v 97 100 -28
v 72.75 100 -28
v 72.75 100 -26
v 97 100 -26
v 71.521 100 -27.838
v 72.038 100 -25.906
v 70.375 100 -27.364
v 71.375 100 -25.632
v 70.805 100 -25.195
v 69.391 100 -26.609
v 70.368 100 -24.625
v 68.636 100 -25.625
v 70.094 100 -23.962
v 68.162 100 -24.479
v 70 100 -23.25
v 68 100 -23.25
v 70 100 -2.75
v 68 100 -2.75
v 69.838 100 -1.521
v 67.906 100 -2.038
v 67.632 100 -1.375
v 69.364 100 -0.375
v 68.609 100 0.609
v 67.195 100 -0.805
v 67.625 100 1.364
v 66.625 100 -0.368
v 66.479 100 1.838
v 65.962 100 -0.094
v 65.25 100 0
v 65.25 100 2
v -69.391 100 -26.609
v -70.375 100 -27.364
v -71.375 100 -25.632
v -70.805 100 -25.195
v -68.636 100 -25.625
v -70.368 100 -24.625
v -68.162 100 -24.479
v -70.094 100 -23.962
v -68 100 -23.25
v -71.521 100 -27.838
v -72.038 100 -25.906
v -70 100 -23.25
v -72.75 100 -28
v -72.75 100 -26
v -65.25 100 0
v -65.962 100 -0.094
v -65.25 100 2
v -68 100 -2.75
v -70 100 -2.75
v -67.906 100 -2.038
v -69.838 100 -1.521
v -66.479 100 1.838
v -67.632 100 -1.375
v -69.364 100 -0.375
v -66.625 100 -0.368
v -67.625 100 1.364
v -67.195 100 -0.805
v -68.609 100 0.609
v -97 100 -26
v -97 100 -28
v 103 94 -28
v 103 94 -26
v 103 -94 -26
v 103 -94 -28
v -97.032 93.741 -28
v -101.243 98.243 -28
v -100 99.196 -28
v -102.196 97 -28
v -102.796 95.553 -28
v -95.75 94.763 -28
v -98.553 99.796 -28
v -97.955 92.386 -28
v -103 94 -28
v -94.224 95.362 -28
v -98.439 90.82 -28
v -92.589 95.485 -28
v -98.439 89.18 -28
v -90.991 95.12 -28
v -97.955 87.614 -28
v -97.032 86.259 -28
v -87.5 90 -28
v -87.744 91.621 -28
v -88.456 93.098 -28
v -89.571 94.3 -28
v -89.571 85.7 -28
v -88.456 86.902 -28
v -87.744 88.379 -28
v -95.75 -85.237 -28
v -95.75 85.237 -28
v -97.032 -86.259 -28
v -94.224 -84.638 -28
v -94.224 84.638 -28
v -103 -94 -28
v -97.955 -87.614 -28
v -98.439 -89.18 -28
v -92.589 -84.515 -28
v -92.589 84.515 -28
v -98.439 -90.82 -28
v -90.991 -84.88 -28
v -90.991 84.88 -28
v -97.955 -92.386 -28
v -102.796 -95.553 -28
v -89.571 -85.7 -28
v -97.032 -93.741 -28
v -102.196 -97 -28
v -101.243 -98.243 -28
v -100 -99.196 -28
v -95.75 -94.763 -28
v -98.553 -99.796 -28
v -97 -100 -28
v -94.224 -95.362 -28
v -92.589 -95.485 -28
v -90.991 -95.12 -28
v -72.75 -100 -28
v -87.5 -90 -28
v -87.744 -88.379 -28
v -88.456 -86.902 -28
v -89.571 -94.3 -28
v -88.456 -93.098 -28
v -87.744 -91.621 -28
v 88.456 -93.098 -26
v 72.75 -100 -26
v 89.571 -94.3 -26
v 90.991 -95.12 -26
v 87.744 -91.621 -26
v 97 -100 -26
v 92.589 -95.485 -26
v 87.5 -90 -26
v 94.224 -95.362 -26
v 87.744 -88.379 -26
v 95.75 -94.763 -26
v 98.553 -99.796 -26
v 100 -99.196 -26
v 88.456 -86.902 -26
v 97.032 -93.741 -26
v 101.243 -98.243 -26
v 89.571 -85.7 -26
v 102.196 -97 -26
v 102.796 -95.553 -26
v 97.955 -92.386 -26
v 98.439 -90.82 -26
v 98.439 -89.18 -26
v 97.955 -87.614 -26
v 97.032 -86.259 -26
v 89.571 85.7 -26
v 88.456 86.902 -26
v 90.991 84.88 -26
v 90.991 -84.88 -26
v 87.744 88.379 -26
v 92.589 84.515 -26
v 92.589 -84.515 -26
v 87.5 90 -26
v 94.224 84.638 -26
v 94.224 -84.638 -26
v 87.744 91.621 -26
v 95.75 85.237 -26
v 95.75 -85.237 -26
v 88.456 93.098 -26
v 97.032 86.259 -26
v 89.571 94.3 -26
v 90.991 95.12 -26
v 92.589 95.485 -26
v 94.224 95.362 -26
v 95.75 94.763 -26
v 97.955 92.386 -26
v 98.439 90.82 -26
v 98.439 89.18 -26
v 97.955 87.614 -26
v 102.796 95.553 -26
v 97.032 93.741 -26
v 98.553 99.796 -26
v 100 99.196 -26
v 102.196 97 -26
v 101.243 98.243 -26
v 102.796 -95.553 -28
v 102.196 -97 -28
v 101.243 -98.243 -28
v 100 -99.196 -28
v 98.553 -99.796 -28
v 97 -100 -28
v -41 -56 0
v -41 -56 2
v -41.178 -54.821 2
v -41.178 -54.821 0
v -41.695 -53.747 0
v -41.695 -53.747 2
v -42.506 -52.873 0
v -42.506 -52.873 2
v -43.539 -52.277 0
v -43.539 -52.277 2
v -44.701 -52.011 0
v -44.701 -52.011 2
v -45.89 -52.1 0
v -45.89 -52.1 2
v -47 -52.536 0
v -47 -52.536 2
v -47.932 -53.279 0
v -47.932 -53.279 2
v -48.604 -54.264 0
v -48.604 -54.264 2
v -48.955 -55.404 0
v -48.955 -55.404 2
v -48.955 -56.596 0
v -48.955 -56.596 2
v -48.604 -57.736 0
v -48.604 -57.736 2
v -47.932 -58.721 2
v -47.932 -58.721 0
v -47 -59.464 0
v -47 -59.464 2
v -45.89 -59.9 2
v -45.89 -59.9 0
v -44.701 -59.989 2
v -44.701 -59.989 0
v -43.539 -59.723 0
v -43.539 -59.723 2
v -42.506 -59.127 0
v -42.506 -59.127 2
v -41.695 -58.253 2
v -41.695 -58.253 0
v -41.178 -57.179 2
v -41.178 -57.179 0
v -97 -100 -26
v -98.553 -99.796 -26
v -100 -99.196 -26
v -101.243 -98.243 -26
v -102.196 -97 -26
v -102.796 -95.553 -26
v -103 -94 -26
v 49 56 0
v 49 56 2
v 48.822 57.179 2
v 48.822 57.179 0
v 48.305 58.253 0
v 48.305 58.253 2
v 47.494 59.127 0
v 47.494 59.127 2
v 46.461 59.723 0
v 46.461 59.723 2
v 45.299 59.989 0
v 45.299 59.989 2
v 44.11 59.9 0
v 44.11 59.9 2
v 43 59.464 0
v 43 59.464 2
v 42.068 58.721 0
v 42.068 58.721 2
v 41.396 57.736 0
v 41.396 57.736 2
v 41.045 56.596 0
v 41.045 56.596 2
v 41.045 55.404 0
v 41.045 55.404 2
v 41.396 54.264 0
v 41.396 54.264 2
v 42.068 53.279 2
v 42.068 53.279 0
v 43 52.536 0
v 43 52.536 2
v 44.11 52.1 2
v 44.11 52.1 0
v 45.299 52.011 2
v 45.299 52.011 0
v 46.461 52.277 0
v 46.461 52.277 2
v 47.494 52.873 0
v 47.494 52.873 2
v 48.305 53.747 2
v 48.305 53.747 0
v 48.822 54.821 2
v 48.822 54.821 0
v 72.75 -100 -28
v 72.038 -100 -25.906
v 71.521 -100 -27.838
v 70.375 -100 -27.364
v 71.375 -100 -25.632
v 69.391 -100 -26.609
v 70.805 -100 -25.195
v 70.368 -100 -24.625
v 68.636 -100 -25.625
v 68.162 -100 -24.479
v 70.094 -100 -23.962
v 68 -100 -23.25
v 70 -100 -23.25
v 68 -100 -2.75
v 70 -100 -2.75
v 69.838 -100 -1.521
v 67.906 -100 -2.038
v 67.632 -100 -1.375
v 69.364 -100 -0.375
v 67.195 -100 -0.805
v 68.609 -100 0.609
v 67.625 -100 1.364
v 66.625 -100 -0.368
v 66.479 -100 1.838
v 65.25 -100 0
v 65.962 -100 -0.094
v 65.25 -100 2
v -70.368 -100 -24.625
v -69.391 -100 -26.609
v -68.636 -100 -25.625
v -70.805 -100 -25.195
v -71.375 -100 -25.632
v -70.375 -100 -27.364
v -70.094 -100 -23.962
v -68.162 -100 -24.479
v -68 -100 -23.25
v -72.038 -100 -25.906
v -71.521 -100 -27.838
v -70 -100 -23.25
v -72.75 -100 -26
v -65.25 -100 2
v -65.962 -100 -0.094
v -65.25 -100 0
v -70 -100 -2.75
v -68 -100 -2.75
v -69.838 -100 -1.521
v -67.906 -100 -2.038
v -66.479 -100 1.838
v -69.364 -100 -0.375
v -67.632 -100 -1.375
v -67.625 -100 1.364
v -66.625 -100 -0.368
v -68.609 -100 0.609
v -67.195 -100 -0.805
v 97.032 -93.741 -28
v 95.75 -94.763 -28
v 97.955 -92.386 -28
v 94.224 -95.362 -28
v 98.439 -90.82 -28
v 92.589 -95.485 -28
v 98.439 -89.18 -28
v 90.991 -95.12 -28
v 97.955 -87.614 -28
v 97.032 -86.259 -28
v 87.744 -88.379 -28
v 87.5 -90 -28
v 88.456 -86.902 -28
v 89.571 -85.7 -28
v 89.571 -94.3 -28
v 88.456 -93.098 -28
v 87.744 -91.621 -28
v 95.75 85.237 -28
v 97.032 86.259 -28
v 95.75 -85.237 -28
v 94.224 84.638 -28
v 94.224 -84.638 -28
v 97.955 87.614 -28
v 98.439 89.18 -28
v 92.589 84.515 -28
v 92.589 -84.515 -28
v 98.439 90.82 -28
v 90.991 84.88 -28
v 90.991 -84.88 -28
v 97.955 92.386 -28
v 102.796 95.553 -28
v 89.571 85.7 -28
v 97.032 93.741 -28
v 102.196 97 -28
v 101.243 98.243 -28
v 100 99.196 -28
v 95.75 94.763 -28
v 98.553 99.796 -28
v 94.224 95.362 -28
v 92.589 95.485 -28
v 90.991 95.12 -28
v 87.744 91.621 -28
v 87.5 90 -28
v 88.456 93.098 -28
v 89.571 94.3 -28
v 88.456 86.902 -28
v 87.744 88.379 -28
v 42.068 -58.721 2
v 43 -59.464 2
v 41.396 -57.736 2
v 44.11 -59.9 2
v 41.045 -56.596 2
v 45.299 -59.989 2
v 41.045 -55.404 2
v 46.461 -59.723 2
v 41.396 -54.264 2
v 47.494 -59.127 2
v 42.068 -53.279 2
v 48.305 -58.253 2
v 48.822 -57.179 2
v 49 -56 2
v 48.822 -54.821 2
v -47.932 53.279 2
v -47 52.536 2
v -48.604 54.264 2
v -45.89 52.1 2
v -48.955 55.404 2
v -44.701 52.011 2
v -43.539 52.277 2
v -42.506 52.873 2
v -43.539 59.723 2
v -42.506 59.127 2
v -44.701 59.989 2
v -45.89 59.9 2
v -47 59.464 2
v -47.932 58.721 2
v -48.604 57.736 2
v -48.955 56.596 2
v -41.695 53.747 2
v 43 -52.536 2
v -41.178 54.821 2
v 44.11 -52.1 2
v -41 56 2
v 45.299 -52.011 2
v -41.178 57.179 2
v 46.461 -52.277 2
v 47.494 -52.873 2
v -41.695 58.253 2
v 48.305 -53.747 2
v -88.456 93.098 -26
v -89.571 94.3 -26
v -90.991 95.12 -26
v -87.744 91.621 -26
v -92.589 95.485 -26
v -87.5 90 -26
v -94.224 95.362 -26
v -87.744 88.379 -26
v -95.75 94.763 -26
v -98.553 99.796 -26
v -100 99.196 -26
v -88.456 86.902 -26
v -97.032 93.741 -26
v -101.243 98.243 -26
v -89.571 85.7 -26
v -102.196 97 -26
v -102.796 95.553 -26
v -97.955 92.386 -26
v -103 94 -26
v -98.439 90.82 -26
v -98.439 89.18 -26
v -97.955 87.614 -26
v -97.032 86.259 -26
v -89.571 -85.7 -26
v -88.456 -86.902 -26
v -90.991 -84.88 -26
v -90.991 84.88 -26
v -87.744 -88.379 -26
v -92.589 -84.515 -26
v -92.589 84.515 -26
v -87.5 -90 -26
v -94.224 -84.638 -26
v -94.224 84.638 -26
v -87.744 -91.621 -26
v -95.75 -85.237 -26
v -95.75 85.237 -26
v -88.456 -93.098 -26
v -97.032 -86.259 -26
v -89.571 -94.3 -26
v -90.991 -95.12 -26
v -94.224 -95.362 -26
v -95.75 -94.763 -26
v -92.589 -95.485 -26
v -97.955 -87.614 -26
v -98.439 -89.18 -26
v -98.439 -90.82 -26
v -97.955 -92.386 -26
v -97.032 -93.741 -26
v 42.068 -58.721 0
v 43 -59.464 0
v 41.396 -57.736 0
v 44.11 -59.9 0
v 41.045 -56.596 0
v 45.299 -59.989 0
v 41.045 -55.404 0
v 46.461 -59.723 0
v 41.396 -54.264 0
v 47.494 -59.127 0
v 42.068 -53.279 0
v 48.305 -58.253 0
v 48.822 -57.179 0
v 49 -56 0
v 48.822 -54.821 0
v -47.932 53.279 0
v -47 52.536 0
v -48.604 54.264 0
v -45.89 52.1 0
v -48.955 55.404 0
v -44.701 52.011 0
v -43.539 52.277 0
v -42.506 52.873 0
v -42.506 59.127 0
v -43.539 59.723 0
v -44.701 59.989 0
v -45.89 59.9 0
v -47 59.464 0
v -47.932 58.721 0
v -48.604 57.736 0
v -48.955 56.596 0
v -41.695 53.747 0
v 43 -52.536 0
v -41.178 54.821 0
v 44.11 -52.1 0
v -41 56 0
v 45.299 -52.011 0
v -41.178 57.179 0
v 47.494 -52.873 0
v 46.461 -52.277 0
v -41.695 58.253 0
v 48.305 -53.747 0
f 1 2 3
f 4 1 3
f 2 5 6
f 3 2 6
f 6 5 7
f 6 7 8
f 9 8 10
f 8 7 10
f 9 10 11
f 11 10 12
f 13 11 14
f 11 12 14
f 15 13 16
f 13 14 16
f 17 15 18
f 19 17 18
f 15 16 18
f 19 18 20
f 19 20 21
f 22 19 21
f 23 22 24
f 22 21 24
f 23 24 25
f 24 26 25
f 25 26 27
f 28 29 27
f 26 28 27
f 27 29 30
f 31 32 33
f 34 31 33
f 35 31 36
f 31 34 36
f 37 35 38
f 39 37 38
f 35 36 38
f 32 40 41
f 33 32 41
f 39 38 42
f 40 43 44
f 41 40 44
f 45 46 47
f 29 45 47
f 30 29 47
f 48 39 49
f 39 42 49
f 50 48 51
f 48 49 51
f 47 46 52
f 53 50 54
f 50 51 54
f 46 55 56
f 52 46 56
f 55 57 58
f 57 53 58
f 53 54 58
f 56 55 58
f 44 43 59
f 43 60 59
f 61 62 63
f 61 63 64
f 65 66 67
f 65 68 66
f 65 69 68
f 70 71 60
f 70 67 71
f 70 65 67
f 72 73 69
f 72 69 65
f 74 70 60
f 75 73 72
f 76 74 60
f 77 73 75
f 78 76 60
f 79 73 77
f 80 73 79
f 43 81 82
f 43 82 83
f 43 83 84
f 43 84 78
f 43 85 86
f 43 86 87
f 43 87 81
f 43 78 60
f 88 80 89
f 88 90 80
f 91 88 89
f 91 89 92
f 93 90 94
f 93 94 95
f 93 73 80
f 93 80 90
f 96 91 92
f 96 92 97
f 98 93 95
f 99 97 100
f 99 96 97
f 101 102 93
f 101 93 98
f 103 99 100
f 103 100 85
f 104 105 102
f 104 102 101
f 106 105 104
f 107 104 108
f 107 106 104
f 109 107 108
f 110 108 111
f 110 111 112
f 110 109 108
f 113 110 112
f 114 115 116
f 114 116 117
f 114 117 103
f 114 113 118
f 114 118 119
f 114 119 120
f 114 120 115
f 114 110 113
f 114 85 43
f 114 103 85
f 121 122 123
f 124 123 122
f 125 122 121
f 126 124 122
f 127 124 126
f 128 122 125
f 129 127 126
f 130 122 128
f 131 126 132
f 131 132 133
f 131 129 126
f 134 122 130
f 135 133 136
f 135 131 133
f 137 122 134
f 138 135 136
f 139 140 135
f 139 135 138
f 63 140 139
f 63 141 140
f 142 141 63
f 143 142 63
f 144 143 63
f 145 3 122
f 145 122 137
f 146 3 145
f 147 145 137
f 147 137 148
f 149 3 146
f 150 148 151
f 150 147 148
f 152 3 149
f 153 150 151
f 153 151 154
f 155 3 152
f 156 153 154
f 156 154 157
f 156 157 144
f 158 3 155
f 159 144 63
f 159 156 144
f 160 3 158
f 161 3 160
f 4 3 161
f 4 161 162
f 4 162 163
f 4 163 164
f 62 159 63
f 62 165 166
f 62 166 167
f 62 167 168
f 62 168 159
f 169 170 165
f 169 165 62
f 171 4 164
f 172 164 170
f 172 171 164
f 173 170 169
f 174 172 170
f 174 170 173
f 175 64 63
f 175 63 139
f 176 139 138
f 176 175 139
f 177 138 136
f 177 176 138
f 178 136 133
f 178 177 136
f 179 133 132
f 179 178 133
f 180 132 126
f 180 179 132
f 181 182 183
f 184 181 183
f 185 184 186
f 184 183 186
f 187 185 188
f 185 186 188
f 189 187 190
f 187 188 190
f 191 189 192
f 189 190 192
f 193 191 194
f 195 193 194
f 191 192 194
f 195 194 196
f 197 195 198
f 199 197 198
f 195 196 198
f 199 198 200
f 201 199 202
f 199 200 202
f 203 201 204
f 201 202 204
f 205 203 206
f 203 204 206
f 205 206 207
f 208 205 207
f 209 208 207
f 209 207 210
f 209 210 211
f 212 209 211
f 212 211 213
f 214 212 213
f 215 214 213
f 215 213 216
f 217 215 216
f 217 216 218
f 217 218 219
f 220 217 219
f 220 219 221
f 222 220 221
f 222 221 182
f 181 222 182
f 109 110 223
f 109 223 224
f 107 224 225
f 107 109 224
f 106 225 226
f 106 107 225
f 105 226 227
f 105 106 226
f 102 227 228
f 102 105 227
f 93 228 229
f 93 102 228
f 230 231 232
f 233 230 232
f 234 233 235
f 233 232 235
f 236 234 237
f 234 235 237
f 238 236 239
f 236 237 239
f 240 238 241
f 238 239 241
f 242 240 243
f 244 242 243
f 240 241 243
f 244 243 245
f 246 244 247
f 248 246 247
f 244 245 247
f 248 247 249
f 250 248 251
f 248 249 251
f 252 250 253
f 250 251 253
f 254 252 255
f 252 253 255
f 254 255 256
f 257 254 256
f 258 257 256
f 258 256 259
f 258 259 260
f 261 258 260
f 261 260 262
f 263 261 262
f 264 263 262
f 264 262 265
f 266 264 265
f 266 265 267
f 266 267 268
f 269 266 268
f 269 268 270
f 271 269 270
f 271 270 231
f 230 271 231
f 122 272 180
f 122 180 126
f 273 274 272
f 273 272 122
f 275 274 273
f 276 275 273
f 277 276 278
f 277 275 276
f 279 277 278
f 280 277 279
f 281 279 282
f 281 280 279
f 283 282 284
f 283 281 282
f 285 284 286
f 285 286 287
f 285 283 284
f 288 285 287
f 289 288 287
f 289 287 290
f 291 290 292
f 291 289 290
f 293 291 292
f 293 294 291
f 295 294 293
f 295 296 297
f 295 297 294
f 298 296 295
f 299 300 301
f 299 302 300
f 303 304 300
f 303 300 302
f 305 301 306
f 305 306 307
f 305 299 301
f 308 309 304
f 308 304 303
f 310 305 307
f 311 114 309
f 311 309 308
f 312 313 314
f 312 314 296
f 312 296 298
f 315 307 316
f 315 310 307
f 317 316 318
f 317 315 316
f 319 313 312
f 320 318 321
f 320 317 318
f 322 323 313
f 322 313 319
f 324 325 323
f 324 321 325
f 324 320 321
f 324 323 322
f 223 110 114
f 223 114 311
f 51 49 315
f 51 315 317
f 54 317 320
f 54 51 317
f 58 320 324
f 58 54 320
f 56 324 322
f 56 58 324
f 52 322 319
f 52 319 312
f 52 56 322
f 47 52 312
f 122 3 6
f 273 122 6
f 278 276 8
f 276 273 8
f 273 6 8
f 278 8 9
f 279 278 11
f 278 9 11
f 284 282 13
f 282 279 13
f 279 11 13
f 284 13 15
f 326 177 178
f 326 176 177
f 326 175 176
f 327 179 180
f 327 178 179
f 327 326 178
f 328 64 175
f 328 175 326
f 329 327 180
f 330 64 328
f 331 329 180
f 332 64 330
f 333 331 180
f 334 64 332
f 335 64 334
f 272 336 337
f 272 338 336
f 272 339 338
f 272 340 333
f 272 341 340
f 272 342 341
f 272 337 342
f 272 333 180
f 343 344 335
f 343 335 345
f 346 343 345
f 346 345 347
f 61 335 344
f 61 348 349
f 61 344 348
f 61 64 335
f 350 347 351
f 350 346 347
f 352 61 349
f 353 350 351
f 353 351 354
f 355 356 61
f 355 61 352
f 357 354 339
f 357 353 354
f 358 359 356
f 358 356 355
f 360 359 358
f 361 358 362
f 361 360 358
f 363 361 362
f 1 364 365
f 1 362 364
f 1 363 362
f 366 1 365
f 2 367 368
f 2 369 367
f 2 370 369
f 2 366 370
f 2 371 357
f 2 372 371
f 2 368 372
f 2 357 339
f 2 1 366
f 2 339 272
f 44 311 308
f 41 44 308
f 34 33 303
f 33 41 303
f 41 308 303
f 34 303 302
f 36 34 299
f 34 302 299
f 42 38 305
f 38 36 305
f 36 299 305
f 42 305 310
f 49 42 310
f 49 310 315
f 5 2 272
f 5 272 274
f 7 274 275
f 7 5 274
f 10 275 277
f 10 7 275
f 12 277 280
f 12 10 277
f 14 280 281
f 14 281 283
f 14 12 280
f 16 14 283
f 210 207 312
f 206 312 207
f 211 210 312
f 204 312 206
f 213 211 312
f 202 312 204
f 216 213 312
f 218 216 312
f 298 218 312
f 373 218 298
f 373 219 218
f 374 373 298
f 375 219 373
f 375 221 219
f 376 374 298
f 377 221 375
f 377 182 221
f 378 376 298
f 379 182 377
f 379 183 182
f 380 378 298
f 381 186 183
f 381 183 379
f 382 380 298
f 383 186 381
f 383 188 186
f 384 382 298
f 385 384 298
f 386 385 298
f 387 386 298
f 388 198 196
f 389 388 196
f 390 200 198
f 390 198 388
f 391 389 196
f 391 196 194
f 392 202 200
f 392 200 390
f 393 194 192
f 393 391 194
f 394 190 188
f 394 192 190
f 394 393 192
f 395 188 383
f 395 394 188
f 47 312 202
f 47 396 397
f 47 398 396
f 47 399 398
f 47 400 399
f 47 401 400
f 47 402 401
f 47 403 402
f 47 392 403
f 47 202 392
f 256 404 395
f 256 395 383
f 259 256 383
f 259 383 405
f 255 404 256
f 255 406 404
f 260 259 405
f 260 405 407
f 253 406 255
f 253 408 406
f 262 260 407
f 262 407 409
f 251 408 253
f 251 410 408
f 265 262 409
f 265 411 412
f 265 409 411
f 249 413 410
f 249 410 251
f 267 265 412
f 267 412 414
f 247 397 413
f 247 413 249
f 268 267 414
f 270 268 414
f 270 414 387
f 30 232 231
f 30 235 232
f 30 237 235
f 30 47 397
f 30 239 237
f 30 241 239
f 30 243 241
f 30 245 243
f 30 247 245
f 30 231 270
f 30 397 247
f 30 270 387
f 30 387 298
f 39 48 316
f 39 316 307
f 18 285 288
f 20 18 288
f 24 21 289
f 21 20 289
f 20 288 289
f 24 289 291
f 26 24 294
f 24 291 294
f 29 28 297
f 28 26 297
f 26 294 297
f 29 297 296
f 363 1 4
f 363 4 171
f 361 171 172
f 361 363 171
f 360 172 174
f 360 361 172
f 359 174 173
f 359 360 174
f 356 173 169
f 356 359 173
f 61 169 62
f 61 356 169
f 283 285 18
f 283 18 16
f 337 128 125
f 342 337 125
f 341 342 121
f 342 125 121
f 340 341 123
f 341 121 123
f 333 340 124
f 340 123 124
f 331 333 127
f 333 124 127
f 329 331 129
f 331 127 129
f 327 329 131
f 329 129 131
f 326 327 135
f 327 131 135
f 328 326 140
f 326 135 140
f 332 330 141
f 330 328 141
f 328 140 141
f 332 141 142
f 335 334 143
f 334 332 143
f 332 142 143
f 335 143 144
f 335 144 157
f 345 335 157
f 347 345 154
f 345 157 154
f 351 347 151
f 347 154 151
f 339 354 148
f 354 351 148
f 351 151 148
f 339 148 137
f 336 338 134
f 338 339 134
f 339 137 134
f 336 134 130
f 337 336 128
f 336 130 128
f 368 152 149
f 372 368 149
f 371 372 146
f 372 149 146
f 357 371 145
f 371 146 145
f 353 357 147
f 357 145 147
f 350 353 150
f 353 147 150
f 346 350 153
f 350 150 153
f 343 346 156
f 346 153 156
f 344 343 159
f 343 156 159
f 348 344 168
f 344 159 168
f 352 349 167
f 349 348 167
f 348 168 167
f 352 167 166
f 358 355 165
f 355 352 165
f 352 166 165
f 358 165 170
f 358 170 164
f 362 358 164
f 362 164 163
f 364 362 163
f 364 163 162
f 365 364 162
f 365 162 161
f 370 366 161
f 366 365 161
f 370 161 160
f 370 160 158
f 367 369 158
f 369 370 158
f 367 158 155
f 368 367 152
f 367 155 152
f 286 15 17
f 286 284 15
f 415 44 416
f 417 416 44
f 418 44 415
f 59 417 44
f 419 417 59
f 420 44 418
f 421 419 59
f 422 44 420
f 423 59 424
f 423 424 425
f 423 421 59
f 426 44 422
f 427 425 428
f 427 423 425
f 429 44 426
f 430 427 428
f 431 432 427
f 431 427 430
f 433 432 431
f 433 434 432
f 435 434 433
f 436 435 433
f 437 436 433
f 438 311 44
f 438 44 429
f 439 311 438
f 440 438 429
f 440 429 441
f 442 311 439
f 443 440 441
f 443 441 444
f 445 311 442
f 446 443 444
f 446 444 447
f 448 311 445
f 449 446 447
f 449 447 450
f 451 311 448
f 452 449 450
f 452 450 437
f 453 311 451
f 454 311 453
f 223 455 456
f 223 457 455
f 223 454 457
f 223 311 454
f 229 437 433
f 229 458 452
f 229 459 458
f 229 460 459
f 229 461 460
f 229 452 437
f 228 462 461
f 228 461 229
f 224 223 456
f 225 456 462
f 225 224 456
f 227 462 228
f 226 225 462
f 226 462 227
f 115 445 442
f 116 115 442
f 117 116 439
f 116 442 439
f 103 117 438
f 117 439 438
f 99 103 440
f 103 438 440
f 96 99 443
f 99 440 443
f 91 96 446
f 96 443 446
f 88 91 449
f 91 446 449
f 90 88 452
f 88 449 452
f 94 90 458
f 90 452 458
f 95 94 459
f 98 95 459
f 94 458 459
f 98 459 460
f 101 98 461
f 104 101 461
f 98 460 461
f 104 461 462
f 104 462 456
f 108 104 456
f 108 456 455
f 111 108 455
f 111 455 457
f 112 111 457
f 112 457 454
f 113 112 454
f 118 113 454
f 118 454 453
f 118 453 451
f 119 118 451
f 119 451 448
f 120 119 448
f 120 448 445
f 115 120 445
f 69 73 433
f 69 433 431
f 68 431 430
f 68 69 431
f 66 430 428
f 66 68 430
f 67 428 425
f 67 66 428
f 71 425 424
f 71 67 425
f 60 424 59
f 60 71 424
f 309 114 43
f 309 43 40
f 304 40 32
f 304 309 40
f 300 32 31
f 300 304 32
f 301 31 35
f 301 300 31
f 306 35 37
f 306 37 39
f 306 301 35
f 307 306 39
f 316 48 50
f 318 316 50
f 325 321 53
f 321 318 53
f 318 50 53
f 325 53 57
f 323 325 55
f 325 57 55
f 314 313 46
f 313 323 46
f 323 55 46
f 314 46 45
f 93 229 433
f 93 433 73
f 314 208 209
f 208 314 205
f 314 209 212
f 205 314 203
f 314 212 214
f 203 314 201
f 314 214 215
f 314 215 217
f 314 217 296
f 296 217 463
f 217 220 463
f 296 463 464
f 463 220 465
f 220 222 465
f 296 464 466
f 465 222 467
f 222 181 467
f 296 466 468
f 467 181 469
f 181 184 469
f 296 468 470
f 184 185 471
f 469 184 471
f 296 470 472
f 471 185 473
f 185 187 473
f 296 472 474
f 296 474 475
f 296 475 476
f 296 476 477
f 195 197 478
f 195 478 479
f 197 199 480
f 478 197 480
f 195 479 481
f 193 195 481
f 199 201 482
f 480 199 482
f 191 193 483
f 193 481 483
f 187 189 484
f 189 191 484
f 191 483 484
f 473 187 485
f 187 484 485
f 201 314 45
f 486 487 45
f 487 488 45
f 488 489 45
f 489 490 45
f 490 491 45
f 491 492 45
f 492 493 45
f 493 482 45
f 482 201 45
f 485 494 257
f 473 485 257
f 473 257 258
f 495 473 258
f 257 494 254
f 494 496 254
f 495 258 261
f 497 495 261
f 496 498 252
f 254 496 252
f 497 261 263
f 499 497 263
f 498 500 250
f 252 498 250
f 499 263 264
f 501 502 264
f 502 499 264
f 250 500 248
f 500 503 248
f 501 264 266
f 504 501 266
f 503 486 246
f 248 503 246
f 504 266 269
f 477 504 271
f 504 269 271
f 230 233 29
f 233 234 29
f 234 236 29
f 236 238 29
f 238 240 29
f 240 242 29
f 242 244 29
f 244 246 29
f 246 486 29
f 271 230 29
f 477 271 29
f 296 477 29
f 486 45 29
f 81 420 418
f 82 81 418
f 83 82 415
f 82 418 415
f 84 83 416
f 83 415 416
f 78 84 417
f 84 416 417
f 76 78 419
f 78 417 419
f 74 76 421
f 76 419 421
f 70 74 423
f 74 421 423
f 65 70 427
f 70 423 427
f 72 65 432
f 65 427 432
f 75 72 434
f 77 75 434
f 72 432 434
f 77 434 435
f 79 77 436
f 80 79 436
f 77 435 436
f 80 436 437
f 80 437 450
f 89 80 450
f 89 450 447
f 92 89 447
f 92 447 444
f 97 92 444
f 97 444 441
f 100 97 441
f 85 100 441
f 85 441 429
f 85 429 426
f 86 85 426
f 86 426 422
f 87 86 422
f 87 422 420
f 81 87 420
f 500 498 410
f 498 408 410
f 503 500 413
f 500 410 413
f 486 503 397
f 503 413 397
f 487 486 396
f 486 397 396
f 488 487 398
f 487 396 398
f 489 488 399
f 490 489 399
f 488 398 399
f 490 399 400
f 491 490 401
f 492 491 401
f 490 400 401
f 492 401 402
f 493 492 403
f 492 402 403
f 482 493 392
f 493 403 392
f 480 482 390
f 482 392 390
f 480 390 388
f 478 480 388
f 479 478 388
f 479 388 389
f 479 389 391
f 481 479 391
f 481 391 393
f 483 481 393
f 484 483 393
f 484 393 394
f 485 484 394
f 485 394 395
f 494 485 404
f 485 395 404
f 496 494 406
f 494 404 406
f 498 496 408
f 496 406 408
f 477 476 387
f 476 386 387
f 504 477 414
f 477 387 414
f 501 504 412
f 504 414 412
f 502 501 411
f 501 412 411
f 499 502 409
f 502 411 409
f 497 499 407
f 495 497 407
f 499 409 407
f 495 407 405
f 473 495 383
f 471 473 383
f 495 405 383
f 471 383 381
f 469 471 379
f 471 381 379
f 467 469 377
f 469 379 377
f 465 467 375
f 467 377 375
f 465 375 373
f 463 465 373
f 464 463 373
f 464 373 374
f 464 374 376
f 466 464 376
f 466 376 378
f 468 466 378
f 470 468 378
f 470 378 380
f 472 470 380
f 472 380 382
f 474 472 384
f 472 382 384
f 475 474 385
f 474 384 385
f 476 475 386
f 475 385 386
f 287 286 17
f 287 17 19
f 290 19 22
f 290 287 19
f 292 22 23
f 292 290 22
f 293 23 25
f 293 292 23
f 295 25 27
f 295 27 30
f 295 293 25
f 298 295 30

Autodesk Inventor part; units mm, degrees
ref_plane "YZ Plane" through (0, 0, 0) normal (1, 0, 0) x (0, 1, 0)
ref_plane "XZ Plane" through (0, 0, 0) normal (0, 1, 0) x (-1, 0, 0)
ref_plane "XY Plane" through (0, 0, 0) normal (0, 0, 1) x (1, 0, 0)
sketch "Sketch1" plane through (0, 0, 0) normal (0, 0, 1) x (1, 0, 0)
  line L0 (-70, -100) -> (70, -100)
  line L1 (70, -100) -> (70, 100)
  line L2 (70, 100) -> (-70, 100)
  line L3 (-70, 100) -> (-70, -100)
  line L4 (-70, -100) -> (70, 100) construction
  line L5 (70, -100) -> (-70, 100) construction
  point P0 (0, 0)
  dimension "d154" = 140
  dimension "d155" = 200
extrude "Plate5" add sketch "Sketch1" along normal blind 2
sketch "Sketch7" plane through (68, -100, 2) normal (1, 0, 0) x (0, 1, 0)
  line L0 (200, 0) -> (0, 0)
  line L1 (0, 0) -> (0, -30)
  line L2 (0, -30) -> (200, -30)
  line L3 (200, -30) -> (200, 0)
edge flange "Flange3" height 30 angle 90 thickness 2 bend radius 2.75 thickness toward (1, 0, 0) relief round relief width 2 relief depth 1 corner gap 2.75 corner form 0 edges at (70, 0, 0) (-70, 0, 0) wall of the first edge with corners at (68, 100, 2) (68, -100, 2) (68, -100, -28) (68, 100, -28)
bend "Bend3"
corner "Corner3"
sketch "Sketch8" plane through (-68, -100, -26) normal (0, 0, -1) x (-1, 0, 0)
  line L0 (0, 200) -> (0, 0)
  line L1 (0, 0) -> (35, 0)
  line L2 (35, 0) -> (35, 200)
  line L3 (35, 200) -> (0, 200)
edge flange "Flange4" height 35 angle 90 thickness 2 bend radius 2.75 thickness toward (0, 0, -1) relief round relief width 2 relief depth 1 corner gap 2.75 corner form 0 edges at (-70, 0, -28) (70, 0, -28) wall of the first edge with corners at (-68, 100, -26) (-68, -100, -26) (-103, -100, -26) (-103, 100, -26)
bend "Bend4"
corner "Corner4"
sketch "Sketch9" plane through (-103, -100, -26) normal (0, 0, 1) x (1, 0, 0)
  line L0 (30.25, 0) -> (30.25, 200) projected
  line L1 (30.25, 200) -> (0, 200) projected
  line L2 (0, 200) -> (0, 0) projected
  line L3 (30.25, 0) -> (0, 0) projected
  circle A0 centre (10, 190) radius 5.5
  circle A1 centre (10, 10) radius 5.5
  point P0 (103, 100)
  dimension "d177" = 11
  dimension "d178" = 10
  dimension "d179" = 10
  dimension "d180" = 10
extrude "Cut1" cut sketch "Sketch9" against normal blind 2 contours A0 | A1
mirror "Mirror1" about plane through (0, 0, 0) normal (1, 0, 0) of "Cut1"
fillet "Corner Round2" radius 6 4 edges at (-103, 100, -27) (-103, -100, -27) (103, 100, -27) (103, -100, -27)
sketch "Sketch10" plane through (0, 0, 2) normal (0, 0, 1) x (1, 0, 0)
  circle A0 centre (-45, 56) radius 4
  line L0 (-45, 56) -> (45, 56) construction
  line L1 (45, 56) -> (45, -56) construction
  line L2 (45, -56) -> (-45, -56) construction
  line L3 (-45, -56) -> (-45, 56) construction
  circle A1 centre (45, 56) radius 4
  circle A2 centre (45, -56) radius 4
  circle A3 centre (-45, -56) radius 4
  point P0 (0, 0)
  point P1 (0, 56)
  point P2 (45, 0)
  dimension "d185" = 8
  dimension "d186" = 90
  dimension "d187" = 112
extrude "Cut2" cut sketch "Sketch10" against normal blind 2
properties part number "TKS mixer support" material "Stainless Steel"
